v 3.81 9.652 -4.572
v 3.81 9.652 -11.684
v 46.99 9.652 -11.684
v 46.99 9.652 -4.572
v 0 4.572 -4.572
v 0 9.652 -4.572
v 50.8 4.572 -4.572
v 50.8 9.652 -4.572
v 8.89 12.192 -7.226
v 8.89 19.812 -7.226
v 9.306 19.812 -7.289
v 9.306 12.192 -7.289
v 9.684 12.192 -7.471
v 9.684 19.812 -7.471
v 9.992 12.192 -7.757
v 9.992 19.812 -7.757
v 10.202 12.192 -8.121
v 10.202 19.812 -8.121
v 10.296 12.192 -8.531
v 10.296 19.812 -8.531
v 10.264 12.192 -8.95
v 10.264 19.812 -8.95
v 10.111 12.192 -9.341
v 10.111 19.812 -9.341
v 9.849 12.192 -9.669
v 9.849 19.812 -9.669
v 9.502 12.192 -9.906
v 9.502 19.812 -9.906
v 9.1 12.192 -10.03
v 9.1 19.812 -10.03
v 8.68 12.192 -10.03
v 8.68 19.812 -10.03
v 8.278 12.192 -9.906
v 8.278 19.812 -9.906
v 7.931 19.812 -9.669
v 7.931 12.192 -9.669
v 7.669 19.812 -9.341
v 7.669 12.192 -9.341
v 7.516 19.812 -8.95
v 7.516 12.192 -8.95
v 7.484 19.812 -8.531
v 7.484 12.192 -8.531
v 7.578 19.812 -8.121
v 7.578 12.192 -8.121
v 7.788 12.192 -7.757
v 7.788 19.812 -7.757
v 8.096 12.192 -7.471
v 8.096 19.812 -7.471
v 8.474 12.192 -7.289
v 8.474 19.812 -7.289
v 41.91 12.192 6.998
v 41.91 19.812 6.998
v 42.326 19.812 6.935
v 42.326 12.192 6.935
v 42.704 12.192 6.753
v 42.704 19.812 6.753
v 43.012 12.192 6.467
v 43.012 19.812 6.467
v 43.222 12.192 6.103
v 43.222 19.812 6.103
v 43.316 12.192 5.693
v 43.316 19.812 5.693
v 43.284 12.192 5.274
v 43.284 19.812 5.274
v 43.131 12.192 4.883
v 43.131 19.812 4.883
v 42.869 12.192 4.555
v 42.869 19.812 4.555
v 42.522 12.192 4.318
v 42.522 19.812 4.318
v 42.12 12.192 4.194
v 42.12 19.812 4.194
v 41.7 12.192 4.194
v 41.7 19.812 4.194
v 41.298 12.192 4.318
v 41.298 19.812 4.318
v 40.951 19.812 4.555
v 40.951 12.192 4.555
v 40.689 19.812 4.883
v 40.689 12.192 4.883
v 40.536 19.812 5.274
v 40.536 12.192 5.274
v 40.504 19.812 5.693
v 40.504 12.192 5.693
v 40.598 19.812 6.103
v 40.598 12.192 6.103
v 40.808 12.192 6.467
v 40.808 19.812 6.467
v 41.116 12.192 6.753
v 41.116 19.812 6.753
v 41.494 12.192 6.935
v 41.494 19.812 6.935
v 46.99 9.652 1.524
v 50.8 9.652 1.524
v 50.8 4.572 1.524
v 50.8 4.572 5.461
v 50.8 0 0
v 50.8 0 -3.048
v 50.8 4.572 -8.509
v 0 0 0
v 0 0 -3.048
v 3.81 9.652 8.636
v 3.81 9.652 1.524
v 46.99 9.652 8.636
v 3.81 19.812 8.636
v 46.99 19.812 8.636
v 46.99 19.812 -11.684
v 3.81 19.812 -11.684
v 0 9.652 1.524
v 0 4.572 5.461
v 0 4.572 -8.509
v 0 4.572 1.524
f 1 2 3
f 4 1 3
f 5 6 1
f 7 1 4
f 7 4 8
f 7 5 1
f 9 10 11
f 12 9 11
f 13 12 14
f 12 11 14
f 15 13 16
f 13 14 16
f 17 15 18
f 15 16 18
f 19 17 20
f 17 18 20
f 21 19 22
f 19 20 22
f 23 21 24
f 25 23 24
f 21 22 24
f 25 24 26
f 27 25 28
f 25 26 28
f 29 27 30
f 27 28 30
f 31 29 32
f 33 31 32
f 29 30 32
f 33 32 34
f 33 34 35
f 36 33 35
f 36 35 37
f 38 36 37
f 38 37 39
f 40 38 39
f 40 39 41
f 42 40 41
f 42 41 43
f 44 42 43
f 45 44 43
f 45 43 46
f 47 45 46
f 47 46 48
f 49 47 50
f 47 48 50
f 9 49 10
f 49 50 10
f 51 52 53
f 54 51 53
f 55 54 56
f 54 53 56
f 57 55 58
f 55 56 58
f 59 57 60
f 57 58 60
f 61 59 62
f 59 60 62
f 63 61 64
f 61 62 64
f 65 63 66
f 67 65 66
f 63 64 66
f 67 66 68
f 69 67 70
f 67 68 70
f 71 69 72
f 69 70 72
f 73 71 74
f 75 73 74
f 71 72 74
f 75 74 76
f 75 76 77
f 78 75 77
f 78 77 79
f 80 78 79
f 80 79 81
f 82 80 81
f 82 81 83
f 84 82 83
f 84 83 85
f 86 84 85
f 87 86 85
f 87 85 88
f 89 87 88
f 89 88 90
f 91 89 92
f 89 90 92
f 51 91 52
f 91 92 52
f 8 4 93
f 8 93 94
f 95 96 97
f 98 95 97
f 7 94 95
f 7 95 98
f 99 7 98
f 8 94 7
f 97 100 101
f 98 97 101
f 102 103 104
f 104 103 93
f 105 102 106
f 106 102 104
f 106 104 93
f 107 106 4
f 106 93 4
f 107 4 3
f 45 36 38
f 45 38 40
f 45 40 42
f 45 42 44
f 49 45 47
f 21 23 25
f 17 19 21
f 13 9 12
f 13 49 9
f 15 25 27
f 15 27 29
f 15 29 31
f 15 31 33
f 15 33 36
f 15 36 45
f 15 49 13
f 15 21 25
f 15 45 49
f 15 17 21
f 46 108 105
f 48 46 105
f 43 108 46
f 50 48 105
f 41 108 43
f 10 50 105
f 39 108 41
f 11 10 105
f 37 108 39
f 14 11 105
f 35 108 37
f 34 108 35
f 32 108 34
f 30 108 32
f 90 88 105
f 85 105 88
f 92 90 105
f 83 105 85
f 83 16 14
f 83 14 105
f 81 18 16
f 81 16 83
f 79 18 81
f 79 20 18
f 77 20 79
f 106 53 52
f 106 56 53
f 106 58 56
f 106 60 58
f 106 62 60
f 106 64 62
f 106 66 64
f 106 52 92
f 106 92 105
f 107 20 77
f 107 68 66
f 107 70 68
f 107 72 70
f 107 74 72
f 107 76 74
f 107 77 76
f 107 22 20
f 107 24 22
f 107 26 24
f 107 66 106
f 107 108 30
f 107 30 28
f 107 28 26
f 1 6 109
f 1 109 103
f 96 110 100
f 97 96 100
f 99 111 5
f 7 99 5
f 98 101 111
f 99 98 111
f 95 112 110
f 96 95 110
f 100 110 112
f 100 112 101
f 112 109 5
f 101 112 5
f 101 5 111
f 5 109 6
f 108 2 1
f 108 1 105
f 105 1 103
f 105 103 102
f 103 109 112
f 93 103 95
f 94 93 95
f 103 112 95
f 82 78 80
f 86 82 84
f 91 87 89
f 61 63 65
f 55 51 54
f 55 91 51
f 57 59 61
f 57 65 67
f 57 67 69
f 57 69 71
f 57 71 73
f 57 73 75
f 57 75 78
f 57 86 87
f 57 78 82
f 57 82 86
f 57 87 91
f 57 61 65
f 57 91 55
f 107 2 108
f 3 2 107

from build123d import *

# Parameters (mm, degrees)
BOSS_EXTRUDE1_DEPTH = 50.8
SKETCH2_W           = 50.8
SKETCH2_H           = 6.096
BOSS_EXTRUDE2_DEPTH = 5.08
SKETCH3_W           = 43.18
SKETCH3_H           = 20.32
BOSS_EXTRUDE3_DEPTH = 10.16
SKETCH4_R           = 1.4097
CUT_EXTRUDE1_DEPTH  = 7.62


with BuildPart() as part:
    # Sketch1 → Boss-Extrude1 (new body)
    with BuildSketch(Plane(origin=(0, 0, 0), x_dir=(0, 0, -1), z_dir=(1, 0, 0))):
        Polygon((0, 0), (3.048, 0), (8.509, 4.572), (-5.461, 4.572), align=None)
    extrude(amount=BOSS_EXTRUDE1_DEPTH)

    # Sketch2 → Boss-Extrude2 (add)
    with BuildSketch(Plane(origin=(0, 4.572, 0), x_dir=(1, 0, 0), z_dir=(0, 1, 0))):
        with Locations((25.4, 1.524)):
            Rectangle(SKETCH2_W, SKETCH2_H)
    extrude(amount=BOSS_EXTRUDE2_DEPTH)

    # Sketch3 → Boss-Extrude3 (add)
    with BuildSketch(Plane(origin=(0, 9.652, 0), x_dir=(1, 0, 0), z_dir=(0, 1, 0))):
        with Locations((25.4, 1.524)):
            Rectangle(SKETCH3_W, SKETCH3_H)
    extrude(amount=BOSS_EXTRUDE3_DEPTH)

    # Sketch4 → Cut-Extrude1 (cut)
    with BuildSketch(Plane(origin=(0, 19.812, 0), x_dir=(1, 0, 0), z_dir=(0, 1, 0))):
        with Locations((41.91, -5.588)):
            Circle(SKETCH4_R)
        with Locations((8.89, 8.636)):
            Circle(SKETCH4_R)
    extrude(amount=-CUT_EXTRUDE1_DEPTH, mode=Mode.SUBTRACT)


solid = part.part
